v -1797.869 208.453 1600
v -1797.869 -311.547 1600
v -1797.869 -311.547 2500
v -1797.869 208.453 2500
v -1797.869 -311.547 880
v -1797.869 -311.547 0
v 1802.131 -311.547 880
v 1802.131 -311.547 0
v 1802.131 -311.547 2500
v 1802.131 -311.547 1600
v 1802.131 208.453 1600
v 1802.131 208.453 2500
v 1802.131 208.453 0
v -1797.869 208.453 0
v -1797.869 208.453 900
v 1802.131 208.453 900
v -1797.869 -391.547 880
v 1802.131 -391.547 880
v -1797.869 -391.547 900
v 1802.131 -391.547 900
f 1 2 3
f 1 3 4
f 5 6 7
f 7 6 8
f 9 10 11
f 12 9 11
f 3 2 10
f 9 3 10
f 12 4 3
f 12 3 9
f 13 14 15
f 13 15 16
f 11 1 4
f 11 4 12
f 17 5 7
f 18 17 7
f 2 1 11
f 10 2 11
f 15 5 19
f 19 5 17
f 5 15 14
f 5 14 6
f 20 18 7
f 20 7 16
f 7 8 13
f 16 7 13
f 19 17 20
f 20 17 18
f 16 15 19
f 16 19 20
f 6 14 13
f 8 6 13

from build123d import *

# Parameters (mm, degrees)
F0_W     = 3600
F0_H     = 520
F1_DEPTH = 880
F2_START = 880
F0_H_2   = 80
F2_DEPTH = 20
F3_START = 1600
F3_DEPTH = 900


with BuildPart() as f1:
    # F0 (on Top) → F1 (new body)
    with BuildSketch(Plane.XY):
        with Locations((2.1305140108, -51.5465147062)):
            Rectangle(F0_W, F0_H)
    extrude(amount=F1_DEPTH)

    # F0 (on Top) → F2 (join)
    with BuildSketch(Plane.XY.offset(F2_START)):
        with Locations((2.1305140108, -51.5465147062)):
            Rectangle(F0_W, F0_H)
        with Locations((2.1305140108, -351.5465147062)):
            Rectangle(F0_W, F0_H_2)
    extrude(amount=F2_DEPTH)


with BuildPart() as f3:
    # F0 (on Top) → F3 (new body)
    with BuildSketch(Plane.XY.offset(F3_START)):
        with Locations((2.1305140108, -51.5465147062)):
            Rectangle(F0_W, F0_H)
    extrude(amount=F3_DEPTH)


solid = Compound([f1.part, f3.part])
